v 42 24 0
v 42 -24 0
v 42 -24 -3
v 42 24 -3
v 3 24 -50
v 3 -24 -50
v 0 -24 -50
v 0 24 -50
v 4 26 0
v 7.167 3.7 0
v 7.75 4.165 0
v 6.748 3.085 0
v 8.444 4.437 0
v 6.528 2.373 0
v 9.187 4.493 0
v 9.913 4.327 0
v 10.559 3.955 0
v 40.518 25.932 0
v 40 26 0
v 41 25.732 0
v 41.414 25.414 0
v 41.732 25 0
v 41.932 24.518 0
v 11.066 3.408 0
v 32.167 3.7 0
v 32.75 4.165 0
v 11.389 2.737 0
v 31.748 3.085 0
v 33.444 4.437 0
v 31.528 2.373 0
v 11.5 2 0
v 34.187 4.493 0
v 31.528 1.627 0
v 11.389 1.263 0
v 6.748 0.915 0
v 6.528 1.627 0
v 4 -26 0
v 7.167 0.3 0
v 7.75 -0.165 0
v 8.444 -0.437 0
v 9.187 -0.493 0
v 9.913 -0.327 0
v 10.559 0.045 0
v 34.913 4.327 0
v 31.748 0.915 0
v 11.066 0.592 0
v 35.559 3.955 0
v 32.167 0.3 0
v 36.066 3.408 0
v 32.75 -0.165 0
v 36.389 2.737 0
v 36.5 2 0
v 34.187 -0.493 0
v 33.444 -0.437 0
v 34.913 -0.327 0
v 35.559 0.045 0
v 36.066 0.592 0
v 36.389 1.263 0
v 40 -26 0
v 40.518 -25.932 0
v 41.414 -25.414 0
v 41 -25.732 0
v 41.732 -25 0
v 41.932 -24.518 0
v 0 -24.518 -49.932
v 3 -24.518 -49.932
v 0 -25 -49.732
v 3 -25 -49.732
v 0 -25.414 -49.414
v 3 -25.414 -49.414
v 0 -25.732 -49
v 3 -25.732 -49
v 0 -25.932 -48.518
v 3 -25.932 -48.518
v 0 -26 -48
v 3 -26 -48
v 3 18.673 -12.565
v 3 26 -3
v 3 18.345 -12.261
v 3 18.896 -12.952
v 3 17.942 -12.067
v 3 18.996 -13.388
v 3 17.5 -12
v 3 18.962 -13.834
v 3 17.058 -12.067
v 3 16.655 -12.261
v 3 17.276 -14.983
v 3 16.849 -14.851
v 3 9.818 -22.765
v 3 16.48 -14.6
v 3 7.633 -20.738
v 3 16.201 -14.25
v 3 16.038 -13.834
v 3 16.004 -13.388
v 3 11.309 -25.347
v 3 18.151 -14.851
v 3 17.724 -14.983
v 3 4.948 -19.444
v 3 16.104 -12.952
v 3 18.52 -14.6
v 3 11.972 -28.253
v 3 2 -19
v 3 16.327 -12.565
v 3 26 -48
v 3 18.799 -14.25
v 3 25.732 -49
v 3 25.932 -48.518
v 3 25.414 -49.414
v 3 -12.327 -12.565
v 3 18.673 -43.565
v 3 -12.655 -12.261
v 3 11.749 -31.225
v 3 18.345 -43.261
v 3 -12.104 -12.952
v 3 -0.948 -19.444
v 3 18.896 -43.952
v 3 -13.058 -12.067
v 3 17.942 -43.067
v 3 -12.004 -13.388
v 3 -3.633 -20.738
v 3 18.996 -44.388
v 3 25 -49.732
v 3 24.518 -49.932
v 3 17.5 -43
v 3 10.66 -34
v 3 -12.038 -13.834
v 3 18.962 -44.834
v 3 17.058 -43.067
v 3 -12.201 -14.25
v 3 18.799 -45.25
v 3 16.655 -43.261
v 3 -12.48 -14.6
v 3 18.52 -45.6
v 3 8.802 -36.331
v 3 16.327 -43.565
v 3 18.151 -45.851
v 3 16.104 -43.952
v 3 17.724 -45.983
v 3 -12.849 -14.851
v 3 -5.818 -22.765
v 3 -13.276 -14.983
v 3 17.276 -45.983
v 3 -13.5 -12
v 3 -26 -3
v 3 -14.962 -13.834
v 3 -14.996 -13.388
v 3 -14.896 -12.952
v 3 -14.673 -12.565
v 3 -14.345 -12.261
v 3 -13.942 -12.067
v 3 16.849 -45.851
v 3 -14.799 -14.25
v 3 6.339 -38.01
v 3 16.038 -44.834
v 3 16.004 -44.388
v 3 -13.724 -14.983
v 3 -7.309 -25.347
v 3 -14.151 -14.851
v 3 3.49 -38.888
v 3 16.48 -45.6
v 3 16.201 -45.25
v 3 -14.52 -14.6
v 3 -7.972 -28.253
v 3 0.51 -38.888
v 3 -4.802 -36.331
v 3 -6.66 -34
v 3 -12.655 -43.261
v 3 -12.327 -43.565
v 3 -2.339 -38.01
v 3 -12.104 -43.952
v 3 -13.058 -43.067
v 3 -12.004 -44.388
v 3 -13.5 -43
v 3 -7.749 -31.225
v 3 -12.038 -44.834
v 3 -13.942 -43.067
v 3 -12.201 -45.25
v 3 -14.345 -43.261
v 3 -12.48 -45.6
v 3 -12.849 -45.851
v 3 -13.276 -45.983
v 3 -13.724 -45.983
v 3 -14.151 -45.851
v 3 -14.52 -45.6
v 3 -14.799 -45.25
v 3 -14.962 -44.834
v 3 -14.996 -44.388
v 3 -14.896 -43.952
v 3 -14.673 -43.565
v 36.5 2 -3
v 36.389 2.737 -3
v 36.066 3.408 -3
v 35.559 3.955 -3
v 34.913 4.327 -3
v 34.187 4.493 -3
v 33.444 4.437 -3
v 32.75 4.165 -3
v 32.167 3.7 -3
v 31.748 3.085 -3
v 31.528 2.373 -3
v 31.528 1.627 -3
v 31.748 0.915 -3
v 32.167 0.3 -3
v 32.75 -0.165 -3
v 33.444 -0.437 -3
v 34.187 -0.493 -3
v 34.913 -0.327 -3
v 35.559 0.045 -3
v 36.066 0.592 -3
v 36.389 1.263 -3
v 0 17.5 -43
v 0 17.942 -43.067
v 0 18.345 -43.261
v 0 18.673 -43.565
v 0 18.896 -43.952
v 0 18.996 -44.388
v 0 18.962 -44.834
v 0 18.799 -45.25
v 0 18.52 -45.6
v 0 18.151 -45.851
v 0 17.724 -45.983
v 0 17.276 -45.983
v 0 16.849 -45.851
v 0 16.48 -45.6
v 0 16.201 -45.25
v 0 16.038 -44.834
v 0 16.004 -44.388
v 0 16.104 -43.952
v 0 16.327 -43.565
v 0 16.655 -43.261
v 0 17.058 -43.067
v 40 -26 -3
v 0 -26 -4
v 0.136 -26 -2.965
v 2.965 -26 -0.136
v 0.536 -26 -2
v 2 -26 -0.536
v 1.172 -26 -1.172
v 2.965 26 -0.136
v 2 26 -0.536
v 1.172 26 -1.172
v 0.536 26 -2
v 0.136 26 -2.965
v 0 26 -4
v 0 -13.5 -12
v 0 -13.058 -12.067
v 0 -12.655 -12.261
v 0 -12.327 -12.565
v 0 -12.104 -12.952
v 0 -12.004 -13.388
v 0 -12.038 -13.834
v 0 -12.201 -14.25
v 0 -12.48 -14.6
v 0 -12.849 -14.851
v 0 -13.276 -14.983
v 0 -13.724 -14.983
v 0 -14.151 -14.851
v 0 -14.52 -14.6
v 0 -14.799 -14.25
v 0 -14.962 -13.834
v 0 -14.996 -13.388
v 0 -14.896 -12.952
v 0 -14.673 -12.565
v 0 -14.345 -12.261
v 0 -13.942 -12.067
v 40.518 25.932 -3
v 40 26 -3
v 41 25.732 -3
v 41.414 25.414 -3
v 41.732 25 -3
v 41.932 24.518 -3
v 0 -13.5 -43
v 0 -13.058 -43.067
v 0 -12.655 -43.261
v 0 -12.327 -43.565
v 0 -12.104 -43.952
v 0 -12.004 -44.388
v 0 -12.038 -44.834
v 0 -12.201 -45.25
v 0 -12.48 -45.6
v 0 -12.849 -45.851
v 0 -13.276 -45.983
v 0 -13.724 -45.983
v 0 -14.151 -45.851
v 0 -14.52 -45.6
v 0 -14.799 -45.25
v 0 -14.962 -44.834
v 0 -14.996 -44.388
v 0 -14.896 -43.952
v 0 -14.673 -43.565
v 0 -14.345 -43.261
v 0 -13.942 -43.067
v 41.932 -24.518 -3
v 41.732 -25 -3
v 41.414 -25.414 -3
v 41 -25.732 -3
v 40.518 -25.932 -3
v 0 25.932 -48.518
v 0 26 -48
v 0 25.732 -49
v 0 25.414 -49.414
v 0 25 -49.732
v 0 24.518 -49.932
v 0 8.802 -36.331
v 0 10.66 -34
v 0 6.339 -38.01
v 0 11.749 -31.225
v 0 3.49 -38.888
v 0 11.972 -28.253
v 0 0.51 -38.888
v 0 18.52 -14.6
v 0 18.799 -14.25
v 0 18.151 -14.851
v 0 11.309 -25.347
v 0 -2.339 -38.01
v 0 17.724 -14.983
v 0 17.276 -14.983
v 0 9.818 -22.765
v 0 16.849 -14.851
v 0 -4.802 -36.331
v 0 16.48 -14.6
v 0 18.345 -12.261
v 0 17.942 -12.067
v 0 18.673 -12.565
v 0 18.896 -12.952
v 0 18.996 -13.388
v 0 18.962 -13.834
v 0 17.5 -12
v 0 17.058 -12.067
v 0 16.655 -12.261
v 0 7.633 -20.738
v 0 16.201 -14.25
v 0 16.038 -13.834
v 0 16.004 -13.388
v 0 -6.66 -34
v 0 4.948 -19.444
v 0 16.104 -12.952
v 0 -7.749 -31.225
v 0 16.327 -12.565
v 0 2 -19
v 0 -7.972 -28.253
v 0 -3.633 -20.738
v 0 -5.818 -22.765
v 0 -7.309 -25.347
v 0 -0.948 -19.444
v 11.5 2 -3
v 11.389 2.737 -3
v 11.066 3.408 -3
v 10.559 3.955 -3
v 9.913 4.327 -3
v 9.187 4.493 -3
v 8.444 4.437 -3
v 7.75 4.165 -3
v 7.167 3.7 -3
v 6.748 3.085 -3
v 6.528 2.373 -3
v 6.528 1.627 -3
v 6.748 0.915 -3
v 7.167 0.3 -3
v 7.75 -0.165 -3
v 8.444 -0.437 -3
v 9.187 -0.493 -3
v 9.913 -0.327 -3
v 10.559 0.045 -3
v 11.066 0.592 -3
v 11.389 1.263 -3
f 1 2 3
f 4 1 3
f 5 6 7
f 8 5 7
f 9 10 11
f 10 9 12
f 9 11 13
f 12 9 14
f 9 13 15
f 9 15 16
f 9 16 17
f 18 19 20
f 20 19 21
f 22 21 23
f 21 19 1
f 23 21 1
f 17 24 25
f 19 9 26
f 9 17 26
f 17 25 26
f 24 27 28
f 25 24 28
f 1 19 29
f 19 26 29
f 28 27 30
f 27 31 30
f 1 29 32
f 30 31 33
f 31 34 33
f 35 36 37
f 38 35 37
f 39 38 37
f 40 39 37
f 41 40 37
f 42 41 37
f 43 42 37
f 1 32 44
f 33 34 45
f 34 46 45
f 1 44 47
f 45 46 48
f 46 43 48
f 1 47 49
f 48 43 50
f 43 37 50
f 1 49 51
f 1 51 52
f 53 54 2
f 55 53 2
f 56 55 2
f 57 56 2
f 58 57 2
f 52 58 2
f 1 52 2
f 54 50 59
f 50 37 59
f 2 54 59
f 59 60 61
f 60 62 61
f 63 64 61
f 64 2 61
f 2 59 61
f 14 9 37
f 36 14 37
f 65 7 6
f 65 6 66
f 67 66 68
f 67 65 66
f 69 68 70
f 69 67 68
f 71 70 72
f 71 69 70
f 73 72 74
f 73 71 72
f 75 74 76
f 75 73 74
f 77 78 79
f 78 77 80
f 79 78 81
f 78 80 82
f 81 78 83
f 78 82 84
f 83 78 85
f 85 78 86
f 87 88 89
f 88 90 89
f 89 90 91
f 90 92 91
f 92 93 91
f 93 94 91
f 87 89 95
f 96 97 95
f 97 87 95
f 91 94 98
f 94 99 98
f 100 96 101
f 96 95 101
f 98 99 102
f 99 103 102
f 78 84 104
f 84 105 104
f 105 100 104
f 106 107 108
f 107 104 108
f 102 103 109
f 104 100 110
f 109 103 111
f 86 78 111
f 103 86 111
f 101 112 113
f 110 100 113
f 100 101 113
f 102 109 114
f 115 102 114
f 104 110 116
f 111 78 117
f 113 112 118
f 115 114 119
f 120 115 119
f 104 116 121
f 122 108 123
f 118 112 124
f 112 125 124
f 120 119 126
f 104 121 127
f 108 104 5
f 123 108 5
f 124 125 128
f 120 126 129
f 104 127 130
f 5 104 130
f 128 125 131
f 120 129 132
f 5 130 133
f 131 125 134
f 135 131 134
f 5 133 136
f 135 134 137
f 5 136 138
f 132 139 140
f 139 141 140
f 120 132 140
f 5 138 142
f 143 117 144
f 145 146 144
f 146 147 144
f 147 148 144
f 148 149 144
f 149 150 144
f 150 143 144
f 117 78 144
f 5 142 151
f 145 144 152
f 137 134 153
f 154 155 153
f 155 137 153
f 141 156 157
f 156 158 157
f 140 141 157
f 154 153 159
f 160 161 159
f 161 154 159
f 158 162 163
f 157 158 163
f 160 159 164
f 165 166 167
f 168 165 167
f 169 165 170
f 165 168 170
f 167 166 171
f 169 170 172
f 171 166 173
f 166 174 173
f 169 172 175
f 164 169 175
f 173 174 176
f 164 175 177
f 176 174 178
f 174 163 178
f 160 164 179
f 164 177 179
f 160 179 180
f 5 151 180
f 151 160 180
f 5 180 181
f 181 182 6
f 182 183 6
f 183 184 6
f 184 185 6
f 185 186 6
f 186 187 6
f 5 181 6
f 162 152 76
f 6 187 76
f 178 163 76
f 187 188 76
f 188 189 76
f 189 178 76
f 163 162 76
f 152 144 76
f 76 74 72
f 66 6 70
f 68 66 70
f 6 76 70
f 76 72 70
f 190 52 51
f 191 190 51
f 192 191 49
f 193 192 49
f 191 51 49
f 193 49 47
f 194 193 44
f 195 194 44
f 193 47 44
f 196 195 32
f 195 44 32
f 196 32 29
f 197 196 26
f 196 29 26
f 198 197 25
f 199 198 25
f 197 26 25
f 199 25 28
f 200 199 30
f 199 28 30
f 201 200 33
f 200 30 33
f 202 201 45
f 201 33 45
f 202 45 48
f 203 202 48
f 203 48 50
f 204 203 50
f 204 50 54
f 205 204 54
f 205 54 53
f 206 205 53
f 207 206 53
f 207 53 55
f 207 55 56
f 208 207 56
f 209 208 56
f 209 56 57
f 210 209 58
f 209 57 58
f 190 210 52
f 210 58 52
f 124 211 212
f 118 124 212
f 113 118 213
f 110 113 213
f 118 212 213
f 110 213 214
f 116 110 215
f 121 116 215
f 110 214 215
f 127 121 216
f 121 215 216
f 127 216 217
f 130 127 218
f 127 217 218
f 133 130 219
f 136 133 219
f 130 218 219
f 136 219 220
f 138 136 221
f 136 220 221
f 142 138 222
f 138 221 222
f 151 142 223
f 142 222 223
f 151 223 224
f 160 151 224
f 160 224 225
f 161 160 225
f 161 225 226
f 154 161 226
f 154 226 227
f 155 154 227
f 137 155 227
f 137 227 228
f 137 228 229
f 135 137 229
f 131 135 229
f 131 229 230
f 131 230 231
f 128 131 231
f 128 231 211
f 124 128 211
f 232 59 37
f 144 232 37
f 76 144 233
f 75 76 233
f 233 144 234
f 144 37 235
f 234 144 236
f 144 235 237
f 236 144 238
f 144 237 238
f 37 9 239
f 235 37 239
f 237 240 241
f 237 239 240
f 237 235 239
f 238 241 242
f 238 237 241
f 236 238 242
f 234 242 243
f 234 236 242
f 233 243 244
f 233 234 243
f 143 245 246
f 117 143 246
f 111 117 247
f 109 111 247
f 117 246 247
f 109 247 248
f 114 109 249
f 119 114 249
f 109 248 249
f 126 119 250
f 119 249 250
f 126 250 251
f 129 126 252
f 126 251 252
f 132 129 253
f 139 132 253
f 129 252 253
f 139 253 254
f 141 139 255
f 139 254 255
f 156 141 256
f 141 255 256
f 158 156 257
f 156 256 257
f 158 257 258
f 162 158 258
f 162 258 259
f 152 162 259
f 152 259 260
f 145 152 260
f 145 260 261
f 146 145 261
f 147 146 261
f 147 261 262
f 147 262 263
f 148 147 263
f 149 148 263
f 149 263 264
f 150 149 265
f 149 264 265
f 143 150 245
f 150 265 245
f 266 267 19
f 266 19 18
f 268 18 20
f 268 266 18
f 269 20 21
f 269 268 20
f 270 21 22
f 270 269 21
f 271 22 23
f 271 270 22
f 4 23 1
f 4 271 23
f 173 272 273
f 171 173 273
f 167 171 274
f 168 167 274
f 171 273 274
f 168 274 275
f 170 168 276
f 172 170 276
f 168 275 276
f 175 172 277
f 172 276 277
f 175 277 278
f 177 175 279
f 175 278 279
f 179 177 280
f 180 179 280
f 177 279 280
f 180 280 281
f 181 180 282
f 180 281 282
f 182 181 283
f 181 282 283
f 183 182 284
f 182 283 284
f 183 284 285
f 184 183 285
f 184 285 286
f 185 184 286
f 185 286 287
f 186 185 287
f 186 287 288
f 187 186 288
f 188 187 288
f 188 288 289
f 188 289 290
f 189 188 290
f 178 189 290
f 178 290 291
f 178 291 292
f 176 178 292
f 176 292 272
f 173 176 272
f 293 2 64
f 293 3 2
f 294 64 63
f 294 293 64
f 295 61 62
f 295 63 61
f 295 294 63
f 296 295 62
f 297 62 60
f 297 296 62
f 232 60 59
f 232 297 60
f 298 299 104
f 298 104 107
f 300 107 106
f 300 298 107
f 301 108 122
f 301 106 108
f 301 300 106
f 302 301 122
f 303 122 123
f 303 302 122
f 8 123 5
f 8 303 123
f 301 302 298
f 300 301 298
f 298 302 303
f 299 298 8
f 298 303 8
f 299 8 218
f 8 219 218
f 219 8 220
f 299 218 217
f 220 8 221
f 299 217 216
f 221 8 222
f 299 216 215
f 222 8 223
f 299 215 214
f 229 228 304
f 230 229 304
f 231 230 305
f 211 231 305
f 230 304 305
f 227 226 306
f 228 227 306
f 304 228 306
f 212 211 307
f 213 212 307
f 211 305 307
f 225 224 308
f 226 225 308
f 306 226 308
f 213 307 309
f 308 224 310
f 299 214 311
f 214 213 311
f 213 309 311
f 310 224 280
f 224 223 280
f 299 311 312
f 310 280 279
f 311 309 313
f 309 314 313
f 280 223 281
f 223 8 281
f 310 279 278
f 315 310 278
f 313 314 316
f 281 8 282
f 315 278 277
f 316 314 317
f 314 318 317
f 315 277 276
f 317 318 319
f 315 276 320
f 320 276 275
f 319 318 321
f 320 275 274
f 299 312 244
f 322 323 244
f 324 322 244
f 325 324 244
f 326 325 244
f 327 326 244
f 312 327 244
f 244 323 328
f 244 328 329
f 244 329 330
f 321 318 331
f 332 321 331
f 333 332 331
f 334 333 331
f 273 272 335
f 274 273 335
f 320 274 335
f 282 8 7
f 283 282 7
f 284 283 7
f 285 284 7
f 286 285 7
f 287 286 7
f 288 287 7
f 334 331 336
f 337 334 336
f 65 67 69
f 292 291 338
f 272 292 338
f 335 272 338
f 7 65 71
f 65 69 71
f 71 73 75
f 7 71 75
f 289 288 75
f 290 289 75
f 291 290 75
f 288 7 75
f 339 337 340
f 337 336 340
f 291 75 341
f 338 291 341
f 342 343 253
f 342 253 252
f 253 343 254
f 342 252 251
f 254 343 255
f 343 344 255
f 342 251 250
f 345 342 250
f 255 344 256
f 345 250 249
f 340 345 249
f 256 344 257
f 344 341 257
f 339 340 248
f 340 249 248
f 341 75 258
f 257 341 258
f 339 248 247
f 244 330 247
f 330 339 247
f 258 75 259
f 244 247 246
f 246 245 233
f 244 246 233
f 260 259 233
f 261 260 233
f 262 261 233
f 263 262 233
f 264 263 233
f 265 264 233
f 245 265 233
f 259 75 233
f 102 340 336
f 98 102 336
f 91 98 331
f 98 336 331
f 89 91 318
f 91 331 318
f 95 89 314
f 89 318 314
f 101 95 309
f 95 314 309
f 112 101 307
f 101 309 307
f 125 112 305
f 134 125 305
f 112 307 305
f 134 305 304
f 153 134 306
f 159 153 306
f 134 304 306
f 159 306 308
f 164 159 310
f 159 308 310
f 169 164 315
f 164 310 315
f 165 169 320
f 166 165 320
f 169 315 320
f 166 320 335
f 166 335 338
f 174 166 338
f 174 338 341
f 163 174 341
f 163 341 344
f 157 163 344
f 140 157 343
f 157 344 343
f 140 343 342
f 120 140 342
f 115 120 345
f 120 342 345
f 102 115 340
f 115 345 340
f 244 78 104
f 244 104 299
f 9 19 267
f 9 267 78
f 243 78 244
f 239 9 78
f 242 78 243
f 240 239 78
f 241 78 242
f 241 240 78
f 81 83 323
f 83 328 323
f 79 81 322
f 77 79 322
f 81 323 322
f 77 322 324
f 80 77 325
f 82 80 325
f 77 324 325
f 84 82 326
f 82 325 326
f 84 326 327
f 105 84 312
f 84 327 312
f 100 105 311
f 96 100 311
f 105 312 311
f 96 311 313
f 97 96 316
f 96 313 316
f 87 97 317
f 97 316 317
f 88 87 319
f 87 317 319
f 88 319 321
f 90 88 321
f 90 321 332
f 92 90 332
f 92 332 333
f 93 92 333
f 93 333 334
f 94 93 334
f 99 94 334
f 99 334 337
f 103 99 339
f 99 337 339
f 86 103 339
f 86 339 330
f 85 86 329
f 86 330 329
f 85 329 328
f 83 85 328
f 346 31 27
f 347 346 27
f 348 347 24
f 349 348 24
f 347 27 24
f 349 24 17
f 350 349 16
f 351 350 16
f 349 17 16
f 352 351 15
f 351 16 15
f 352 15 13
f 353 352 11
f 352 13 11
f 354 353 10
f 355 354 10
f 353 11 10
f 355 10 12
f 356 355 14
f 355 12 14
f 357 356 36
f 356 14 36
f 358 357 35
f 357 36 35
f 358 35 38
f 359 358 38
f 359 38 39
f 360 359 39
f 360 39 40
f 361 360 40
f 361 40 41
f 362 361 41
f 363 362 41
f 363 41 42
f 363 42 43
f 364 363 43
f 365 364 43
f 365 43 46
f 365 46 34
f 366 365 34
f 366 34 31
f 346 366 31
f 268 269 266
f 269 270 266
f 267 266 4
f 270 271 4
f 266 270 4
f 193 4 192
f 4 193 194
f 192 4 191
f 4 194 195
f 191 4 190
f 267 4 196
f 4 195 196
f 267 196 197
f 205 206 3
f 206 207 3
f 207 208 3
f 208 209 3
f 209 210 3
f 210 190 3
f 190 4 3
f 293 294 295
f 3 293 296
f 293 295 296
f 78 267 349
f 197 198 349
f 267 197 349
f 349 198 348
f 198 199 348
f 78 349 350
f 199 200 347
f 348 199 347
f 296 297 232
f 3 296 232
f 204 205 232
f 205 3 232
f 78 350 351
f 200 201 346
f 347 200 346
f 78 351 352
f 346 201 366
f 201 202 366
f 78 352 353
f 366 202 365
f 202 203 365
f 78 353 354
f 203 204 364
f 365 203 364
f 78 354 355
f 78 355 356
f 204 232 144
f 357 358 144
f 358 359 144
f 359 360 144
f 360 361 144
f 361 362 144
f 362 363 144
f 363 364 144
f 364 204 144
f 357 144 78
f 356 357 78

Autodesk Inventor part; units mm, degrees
ref_plane "YZ Plane" through (0, 0, 0) normal (1, 0, 0) x (0, 1, 0)
ref_plane "XZ Plane" through (0, 0, 0) normal (0, 1, 0) x (-1, 0, 0)
ref_plane "XY Plane" through (0, 0, 0) normal (0, 0, 1) x (1, 0, 0)
sketch "Skizze1" plane through (0, 0, 0) normal (0, 1, 0) x (-1, 0, 0)
  line L0 (0, -50) -> (0, -4)
  line L1 (-4, 0) -> (-42, 0)
  line L2 (-42, 0) -> (-42, -3)
  line L3 (-42, -3) -> (-3, -3)
  line L4 (-3, -3) -> (-3, -50)
  line L5 (-3, -50) -> (0, -50)
  arc A0 (0, -4) -> (-4, 0) centre (-4, -4) ccw
  line L6 (0, -60.1657) -> (0, 10.9941) projected
  line L7 (9.3941, 0) -> (-50.5657, 0) projected
  point P0 (0, 0)
  point P1 (0, 0)
  dimension "d0" = 42
  dimension "d1" = 50
  dimension "d2" = 3
  dimension "d3" = 4
extrude "Extrusion1" add sketch "Skizze1" along normal mid plane 52 contours L5 L4 L3 L2 L1 A0 L0
fillet "Rundung1" radius 2 4 edges at (1.5, 26, -50) (1.5, -26, -50) (42, 26, -1.5) (42, -26, -1.5)
sketch "Skizze2" plane through (4, -26, 0) normal (0, 0, 1) x (1, 0, 0)
  circle A0 centre (5, 28) radius 2.5
  circle A1 centre (30, 28) radius 2.5
  line L0 (38, 2) -> (38, 50) projected
  line L1 (-166, 18) -> (204, 18) projected
  line L2 (-1, 0) -> (36, 0) projected
  line L3 (204, 18) -> (-166, 18) projected
  point P0 (-4, 26)
  point P1 (38, 26)
  dimension "d7" = 5
  dimension "d8" = 8
  dimension "d9" = 25
  dimension "d25" = 10
  dimension "d26" = 10
extrude "Extrusion2" cut sketch "Skizze2" against normal through all
sketch "Skizze3" plane through (0, -26, -4) normal (-1, 0, 0) x (0, 0, 1)
  circle A0 centre (-40.5, 43.5) radius 1.5
  circle A1 centre (-9.5, 43.5) radius 1.5
  circle A2 centre (-9.5, 12.5) radius 1.5
  circle A3 centre (-40.5, 12.5) radius 1.5
  circle A4 centre (-25, 28) radius 10
  line L0 (-46, 50) -> (-46, 2) projected
  line L1 (-25, 41.9808) -> (-25, 15.4808)
  circle A5 centre (-25, 28) radius 2.5 projected
  point P0 (4, 26)
  dimension "d12" = 31
  dimension "d13" = 31
  dimension "d14" = 3
  dimension "d16" = 20
  dimension "d21" = 15.5
  dimension "d22" = 31
extrude "Extrusion3" cut sketch "Skizze3" against normal through all
properties part number "YAufnahmeMotor"
